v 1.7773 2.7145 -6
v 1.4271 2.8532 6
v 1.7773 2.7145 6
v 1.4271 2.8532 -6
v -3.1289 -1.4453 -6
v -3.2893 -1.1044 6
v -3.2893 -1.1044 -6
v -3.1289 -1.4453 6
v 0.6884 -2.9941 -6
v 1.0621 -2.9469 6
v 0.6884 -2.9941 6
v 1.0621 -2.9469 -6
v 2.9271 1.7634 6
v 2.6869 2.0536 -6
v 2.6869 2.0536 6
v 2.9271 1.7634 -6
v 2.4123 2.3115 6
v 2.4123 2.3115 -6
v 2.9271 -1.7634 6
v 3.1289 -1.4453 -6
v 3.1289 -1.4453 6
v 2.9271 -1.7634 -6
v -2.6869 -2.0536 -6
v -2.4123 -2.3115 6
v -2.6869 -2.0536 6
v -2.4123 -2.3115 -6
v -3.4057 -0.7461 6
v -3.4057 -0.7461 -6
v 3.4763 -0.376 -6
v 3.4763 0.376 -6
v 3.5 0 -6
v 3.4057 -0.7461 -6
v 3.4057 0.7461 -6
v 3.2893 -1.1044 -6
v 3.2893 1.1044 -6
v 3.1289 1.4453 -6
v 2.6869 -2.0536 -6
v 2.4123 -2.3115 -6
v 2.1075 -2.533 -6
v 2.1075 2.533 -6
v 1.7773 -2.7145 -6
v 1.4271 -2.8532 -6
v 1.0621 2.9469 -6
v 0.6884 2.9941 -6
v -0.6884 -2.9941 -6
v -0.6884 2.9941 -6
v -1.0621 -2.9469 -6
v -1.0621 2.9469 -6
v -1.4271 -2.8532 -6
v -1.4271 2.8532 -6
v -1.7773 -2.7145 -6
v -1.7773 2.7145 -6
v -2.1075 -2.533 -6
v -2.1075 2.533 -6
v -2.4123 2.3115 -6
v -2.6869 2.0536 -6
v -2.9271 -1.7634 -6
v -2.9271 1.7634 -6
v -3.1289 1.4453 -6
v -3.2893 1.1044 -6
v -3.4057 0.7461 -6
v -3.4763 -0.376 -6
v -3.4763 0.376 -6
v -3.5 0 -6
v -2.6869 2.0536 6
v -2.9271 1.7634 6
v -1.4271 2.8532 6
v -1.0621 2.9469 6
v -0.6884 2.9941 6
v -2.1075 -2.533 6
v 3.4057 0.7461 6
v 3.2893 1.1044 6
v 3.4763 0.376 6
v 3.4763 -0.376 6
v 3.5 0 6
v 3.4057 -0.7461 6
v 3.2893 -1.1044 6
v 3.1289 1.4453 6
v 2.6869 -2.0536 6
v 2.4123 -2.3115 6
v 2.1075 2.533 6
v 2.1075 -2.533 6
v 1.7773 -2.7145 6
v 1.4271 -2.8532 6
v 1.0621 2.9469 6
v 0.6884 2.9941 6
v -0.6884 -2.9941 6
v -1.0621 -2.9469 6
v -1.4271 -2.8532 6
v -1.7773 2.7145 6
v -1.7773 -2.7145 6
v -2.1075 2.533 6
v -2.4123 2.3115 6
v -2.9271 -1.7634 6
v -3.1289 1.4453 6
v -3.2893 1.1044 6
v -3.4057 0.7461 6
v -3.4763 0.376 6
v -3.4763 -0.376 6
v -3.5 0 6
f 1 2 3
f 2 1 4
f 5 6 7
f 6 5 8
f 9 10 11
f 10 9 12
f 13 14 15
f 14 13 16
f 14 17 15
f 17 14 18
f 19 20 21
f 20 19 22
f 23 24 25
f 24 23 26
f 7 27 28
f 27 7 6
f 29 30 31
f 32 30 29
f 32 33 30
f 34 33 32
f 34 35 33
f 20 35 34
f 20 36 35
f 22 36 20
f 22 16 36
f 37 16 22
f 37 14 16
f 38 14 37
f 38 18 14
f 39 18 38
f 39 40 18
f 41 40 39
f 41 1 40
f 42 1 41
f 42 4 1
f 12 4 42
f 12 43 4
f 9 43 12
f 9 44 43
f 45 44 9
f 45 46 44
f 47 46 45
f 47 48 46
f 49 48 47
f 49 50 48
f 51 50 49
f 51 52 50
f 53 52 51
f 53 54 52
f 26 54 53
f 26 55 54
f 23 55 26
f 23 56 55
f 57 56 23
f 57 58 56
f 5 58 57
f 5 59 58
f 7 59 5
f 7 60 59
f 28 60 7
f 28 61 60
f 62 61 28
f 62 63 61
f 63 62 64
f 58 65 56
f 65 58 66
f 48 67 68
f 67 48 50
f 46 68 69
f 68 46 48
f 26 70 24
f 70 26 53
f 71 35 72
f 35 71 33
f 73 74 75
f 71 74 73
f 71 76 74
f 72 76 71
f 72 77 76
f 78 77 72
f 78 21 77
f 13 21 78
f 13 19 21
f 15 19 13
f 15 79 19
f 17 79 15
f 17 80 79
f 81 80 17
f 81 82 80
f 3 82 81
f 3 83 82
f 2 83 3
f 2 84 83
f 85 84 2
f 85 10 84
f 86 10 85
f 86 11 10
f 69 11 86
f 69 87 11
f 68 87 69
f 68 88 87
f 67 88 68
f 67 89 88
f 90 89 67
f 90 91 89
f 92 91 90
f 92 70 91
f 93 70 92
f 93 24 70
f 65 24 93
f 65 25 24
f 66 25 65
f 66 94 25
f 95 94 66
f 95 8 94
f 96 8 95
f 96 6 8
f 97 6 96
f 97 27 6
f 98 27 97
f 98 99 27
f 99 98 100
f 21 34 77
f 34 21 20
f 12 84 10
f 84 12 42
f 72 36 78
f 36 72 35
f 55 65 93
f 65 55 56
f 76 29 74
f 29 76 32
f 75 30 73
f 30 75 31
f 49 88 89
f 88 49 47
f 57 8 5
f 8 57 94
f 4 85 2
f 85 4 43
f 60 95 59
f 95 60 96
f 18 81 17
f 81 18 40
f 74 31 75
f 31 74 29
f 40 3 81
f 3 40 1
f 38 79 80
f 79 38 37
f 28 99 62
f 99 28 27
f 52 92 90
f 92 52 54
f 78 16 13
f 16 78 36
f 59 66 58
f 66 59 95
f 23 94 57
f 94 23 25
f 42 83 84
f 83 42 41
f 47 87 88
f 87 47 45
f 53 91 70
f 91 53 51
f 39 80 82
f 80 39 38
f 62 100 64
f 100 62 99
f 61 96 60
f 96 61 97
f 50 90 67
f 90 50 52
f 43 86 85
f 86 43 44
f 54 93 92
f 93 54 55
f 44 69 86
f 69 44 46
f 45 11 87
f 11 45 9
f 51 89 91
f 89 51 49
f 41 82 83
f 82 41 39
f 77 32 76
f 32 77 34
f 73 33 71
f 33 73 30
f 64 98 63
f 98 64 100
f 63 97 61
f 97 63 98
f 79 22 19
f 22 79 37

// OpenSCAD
$fn = 50;

difference() {
	union() {
		translate(v = [0, 0, -6.0]) {
			rotate(a = [0, 0, 0]) {
				difference() {
					union() {
						hull() {
							translate(v = [0.5, 0, 0]) {
								cylinder(h = 12, r = 3, r1 = 3, r2 = 3);
							}
							translate(v = [-0.5, 0, 0]) {
								cylinder(h = 12, r = 3, r1 = 3, r2 = 3);
							}
						}
					}
					union();
				}
			}
		}
	}
	union();
}
